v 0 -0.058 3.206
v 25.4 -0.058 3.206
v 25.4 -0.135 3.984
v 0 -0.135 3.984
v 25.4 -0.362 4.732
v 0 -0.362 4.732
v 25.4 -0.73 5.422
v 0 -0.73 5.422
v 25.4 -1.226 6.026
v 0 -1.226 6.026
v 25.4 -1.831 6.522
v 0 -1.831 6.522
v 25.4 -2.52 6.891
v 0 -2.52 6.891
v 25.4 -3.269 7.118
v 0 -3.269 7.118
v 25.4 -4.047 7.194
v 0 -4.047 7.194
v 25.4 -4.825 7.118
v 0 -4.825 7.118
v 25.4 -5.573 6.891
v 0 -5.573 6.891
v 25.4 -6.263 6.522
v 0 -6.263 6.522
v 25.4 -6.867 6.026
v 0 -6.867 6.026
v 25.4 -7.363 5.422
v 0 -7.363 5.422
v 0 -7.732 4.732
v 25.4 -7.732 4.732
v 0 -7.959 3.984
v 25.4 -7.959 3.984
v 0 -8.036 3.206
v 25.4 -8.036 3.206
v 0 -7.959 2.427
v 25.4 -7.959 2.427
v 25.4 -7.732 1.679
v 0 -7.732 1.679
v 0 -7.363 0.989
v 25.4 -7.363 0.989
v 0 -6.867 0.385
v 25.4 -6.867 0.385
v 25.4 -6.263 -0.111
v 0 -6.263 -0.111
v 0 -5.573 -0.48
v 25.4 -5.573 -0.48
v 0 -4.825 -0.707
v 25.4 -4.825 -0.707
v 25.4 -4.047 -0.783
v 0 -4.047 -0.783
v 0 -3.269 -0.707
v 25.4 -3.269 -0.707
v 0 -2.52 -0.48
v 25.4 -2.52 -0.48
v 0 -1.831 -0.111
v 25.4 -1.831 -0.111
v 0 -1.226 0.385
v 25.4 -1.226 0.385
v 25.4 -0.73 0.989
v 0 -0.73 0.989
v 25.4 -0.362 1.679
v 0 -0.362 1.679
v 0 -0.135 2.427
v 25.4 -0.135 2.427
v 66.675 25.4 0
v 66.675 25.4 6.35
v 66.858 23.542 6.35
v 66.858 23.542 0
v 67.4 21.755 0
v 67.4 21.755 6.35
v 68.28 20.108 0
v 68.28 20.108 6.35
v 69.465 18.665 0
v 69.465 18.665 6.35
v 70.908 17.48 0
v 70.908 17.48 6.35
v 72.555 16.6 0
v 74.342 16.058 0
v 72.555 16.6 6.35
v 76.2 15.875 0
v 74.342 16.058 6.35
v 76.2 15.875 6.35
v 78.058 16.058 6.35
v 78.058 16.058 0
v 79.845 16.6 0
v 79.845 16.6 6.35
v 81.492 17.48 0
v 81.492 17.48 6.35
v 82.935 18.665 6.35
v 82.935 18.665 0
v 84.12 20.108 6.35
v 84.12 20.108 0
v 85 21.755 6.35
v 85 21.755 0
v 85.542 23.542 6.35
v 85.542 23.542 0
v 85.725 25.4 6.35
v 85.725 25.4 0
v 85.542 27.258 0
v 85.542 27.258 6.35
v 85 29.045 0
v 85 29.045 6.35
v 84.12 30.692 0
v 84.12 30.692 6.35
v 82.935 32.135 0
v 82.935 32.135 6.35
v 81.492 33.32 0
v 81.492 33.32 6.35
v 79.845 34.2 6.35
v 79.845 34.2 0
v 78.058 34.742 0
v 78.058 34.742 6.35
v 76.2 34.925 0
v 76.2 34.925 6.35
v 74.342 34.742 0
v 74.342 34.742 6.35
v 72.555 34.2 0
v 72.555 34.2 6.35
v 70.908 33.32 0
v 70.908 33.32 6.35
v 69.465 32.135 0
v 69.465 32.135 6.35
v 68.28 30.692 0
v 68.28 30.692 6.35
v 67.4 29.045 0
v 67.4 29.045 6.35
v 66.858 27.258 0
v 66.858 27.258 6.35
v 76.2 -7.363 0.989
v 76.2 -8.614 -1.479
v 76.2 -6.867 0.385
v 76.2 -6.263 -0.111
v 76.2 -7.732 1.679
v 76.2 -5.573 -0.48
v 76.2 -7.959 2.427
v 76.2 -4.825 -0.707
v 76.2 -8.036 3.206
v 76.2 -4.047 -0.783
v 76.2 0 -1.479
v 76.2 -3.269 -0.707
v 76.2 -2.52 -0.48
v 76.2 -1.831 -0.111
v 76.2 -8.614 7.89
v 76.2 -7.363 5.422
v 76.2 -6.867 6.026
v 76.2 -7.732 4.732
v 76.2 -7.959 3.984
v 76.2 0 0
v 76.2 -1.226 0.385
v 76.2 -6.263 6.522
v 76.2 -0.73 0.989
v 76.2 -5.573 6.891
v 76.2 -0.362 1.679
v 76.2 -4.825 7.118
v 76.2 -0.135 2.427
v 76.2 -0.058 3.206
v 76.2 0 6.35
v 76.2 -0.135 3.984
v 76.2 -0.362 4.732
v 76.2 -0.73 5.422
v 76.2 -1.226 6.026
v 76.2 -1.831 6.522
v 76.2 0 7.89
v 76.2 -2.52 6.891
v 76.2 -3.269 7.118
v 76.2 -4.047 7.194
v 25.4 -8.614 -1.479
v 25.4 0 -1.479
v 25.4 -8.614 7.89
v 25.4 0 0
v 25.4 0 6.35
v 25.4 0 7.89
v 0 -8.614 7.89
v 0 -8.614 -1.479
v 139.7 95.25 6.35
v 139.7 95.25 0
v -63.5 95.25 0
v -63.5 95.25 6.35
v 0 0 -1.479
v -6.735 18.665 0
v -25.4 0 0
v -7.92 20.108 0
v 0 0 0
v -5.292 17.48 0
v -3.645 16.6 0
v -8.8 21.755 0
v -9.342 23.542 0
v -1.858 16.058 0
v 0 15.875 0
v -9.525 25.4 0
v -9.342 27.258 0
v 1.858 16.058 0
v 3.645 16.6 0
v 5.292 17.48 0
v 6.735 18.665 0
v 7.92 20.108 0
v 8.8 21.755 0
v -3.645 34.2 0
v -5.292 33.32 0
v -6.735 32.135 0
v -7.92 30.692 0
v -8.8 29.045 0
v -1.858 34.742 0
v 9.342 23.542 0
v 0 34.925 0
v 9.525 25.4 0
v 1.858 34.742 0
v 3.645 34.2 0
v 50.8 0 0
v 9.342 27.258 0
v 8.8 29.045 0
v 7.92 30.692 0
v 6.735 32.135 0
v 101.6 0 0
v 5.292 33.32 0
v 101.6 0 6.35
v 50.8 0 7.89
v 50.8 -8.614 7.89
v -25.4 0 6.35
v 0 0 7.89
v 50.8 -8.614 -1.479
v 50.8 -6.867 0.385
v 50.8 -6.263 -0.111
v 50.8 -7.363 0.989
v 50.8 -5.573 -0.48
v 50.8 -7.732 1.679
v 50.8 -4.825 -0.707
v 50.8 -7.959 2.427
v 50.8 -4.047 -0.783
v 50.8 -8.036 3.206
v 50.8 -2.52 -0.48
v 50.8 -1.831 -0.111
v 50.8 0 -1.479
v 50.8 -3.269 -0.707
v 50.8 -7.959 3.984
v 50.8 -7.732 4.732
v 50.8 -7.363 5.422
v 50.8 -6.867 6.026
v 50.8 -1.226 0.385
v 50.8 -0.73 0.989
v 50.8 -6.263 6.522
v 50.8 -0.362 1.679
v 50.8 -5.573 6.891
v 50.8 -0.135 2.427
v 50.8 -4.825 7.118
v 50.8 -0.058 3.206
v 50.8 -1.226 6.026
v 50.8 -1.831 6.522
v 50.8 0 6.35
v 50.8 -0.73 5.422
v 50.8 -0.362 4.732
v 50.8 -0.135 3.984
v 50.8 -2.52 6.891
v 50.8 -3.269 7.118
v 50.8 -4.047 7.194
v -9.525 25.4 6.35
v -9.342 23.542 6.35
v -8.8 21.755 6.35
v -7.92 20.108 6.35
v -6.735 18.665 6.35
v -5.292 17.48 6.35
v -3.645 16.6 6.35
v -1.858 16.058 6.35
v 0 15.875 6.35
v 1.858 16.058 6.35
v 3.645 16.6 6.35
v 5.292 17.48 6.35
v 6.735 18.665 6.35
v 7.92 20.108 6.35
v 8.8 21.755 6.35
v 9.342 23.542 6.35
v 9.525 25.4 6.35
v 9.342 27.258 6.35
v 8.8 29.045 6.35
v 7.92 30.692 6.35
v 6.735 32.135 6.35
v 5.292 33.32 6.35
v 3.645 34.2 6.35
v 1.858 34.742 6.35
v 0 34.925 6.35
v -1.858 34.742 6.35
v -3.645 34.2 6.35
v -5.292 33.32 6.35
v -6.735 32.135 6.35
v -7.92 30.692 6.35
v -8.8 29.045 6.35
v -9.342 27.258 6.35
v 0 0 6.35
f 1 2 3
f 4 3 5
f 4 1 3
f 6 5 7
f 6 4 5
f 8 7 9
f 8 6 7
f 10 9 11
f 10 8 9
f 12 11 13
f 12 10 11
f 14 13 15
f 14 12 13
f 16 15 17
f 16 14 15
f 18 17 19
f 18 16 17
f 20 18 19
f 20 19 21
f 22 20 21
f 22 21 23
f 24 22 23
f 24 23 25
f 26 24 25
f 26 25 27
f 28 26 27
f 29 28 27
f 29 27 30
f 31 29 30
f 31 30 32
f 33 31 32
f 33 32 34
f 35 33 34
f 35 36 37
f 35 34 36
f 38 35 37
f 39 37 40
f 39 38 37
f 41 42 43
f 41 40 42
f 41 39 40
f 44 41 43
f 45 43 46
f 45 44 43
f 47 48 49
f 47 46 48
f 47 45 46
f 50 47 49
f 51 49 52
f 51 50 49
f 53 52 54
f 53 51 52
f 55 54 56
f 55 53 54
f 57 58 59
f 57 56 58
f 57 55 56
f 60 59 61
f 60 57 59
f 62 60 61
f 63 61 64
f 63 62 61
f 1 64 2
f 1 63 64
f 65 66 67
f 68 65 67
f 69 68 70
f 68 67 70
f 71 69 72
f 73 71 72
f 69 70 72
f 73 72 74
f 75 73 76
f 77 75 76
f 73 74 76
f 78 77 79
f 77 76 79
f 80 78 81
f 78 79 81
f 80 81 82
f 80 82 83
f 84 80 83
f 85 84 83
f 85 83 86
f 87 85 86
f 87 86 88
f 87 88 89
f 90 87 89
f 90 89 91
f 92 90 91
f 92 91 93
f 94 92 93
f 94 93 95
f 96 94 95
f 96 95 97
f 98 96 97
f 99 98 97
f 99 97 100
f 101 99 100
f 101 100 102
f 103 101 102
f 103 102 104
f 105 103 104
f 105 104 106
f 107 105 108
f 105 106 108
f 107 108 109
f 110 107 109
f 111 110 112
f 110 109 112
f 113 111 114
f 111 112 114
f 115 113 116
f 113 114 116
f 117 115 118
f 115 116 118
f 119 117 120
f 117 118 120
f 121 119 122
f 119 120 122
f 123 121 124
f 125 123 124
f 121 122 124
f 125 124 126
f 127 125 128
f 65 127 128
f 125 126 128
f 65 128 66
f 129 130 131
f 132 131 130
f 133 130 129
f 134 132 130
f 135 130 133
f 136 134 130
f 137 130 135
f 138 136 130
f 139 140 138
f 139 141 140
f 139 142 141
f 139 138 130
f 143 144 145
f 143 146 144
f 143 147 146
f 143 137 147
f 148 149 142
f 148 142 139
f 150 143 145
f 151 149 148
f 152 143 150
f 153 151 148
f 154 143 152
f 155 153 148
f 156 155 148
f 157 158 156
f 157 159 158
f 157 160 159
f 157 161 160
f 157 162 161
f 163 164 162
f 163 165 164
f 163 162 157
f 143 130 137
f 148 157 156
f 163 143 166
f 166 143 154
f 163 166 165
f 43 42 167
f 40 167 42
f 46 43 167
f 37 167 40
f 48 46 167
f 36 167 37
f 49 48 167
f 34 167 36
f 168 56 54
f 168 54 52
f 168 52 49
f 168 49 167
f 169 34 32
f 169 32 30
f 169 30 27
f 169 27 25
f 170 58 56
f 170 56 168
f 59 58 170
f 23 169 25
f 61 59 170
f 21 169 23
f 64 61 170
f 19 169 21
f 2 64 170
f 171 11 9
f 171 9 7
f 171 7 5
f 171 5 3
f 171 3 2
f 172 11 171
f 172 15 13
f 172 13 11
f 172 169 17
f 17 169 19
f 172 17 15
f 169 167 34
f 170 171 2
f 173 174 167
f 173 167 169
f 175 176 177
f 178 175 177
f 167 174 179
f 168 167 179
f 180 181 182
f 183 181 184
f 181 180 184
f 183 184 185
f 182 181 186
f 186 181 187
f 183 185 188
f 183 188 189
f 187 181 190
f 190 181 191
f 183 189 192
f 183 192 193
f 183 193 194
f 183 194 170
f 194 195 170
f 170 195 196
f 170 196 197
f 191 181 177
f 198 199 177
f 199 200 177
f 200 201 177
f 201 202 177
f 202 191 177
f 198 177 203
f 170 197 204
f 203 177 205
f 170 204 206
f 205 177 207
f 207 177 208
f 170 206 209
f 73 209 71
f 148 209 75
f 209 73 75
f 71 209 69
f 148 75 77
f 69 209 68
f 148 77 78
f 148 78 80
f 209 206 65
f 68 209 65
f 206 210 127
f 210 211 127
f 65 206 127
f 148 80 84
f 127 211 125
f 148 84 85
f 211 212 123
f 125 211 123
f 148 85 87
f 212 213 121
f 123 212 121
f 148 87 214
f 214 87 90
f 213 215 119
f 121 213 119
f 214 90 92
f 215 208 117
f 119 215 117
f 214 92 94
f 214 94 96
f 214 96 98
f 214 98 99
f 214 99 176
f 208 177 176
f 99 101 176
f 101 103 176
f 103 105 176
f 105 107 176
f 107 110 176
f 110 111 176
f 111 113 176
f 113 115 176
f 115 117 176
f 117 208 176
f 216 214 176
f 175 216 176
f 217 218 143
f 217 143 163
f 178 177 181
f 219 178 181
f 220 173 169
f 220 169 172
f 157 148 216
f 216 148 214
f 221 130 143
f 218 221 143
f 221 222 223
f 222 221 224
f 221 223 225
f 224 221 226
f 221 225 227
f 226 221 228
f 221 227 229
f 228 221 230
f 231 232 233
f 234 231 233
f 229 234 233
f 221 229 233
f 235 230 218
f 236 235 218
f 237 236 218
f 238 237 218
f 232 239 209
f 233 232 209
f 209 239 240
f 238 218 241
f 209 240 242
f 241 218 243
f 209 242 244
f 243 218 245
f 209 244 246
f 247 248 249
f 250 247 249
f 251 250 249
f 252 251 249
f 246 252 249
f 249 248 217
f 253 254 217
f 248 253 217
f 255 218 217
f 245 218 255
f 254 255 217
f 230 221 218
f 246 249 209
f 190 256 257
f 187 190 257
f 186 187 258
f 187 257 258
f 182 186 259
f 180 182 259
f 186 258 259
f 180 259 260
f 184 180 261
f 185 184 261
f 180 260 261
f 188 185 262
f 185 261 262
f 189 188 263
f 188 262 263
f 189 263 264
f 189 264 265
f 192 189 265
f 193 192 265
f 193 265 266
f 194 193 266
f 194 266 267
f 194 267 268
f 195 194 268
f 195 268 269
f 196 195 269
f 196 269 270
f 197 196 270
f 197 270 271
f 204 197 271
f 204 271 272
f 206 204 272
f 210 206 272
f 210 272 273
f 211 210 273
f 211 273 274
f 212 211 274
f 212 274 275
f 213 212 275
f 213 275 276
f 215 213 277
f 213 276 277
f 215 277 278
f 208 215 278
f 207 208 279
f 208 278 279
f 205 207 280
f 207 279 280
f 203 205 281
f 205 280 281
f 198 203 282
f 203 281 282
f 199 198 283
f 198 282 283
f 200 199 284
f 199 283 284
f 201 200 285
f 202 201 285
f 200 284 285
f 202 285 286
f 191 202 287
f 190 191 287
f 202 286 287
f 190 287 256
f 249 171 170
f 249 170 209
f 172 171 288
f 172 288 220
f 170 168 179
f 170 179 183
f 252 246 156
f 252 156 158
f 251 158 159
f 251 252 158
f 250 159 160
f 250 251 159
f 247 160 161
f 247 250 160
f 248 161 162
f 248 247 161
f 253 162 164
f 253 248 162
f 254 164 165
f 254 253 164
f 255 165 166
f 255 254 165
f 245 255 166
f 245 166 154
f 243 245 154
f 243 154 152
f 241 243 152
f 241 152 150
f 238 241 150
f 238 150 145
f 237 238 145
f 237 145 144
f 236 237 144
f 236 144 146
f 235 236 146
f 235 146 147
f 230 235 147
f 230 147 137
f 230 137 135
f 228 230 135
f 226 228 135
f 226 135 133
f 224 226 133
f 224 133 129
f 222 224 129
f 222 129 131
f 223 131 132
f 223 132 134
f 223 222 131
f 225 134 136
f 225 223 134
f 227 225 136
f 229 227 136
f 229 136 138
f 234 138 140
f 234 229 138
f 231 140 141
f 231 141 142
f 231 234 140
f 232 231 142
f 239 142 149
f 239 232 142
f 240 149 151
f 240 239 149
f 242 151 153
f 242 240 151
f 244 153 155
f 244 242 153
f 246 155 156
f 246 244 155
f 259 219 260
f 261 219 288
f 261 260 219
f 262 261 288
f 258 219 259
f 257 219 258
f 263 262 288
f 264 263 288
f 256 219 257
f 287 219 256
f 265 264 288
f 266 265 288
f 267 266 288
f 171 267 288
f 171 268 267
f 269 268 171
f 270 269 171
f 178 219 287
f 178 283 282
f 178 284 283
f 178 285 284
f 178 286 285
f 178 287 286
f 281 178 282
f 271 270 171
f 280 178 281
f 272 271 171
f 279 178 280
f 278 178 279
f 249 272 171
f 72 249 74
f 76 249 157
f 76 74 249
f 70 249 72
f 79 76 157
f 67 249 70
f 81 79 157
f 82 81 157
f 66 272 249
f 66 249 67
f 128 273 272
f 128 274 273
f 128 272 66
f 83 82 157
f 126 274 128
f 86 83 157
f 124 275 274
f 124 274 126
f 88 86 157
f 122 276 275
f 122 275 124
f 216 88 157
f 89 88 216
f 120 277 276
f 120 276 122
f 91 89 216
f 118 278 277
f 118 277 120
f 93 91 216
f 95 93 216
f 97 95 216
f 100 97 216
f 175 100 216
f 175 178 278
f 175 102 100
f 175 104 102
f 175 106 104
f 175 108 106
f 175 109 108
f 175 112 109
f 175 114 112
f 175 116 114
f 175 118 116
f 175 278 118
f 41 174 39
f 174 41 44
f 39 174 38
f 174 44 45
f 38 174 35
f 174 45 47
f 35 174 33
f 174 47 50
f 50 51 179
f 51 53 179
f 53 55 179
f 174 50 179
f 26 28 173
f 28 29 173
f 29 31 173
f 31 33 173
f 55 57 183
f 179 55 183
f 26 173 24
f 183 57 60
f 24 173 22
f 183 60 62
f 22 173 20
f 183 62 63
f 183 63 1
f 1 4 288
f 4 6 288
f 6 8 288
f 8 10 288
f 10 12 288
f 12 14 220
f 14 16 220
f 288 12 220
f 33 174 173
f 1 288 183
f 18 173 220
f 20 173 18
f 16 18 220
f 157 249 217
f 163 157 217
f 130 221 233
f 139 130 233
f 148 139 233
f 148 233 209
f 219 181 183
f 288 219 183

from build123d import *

# Parameters (mm, degrees)
F1_DEPTH = 6.35
F2_W     = 8.614382
F2_H     = 9.368035
F2_R     = 3.988724
F3_DEPTH = 76.2
F4_W     = 25.4
F4_H     = 8.614382
F5_DEPTH = 25.4
F8_D     = 19.05


with BuildPart() as f1:
    # F0 (on Top) → F1 (new body)
    with BuildSketch(Plane.XY):
        Polygon((139.7, 95.249673), (-63.5, 95.249673), (-25.4, 0), (101.6, 0), align=None)
    extrude(amount=F1_DEPTH)

    # F2 (on Right) → F3 (join)
    with BuildSketch(Plane.YZ):
        with Locations((-4.307191, 3.2055)):
            Rectangle(F2_W, F2_H)
        with Locations((-4.046882, 3.205501)):
            Circle(F2_R, mode=Mode.SUBTRACT)
    extrude(amount=F3_DEPTH)

    # F4 (on face) → F5 (cut)
    with BuildSketch(Plane.XY.offset(7.889518)):
        with Locations((38.1, -4.307191)):
            Rectangle(F4_W, F4_H)
    extrude(amount=-F5_DEPTH, mode=Mode.SUBTRACT)

    # F8 (through all)
    with Locations(Plane(origin=(0, 0, 0), x_dir=(1, 0, 0), z_dir=(0, 0, -1))):
        with Locations((0, -25.4), (76.2, -25.4)):
            Hole(F8_D / 2)


solid = f1.part
